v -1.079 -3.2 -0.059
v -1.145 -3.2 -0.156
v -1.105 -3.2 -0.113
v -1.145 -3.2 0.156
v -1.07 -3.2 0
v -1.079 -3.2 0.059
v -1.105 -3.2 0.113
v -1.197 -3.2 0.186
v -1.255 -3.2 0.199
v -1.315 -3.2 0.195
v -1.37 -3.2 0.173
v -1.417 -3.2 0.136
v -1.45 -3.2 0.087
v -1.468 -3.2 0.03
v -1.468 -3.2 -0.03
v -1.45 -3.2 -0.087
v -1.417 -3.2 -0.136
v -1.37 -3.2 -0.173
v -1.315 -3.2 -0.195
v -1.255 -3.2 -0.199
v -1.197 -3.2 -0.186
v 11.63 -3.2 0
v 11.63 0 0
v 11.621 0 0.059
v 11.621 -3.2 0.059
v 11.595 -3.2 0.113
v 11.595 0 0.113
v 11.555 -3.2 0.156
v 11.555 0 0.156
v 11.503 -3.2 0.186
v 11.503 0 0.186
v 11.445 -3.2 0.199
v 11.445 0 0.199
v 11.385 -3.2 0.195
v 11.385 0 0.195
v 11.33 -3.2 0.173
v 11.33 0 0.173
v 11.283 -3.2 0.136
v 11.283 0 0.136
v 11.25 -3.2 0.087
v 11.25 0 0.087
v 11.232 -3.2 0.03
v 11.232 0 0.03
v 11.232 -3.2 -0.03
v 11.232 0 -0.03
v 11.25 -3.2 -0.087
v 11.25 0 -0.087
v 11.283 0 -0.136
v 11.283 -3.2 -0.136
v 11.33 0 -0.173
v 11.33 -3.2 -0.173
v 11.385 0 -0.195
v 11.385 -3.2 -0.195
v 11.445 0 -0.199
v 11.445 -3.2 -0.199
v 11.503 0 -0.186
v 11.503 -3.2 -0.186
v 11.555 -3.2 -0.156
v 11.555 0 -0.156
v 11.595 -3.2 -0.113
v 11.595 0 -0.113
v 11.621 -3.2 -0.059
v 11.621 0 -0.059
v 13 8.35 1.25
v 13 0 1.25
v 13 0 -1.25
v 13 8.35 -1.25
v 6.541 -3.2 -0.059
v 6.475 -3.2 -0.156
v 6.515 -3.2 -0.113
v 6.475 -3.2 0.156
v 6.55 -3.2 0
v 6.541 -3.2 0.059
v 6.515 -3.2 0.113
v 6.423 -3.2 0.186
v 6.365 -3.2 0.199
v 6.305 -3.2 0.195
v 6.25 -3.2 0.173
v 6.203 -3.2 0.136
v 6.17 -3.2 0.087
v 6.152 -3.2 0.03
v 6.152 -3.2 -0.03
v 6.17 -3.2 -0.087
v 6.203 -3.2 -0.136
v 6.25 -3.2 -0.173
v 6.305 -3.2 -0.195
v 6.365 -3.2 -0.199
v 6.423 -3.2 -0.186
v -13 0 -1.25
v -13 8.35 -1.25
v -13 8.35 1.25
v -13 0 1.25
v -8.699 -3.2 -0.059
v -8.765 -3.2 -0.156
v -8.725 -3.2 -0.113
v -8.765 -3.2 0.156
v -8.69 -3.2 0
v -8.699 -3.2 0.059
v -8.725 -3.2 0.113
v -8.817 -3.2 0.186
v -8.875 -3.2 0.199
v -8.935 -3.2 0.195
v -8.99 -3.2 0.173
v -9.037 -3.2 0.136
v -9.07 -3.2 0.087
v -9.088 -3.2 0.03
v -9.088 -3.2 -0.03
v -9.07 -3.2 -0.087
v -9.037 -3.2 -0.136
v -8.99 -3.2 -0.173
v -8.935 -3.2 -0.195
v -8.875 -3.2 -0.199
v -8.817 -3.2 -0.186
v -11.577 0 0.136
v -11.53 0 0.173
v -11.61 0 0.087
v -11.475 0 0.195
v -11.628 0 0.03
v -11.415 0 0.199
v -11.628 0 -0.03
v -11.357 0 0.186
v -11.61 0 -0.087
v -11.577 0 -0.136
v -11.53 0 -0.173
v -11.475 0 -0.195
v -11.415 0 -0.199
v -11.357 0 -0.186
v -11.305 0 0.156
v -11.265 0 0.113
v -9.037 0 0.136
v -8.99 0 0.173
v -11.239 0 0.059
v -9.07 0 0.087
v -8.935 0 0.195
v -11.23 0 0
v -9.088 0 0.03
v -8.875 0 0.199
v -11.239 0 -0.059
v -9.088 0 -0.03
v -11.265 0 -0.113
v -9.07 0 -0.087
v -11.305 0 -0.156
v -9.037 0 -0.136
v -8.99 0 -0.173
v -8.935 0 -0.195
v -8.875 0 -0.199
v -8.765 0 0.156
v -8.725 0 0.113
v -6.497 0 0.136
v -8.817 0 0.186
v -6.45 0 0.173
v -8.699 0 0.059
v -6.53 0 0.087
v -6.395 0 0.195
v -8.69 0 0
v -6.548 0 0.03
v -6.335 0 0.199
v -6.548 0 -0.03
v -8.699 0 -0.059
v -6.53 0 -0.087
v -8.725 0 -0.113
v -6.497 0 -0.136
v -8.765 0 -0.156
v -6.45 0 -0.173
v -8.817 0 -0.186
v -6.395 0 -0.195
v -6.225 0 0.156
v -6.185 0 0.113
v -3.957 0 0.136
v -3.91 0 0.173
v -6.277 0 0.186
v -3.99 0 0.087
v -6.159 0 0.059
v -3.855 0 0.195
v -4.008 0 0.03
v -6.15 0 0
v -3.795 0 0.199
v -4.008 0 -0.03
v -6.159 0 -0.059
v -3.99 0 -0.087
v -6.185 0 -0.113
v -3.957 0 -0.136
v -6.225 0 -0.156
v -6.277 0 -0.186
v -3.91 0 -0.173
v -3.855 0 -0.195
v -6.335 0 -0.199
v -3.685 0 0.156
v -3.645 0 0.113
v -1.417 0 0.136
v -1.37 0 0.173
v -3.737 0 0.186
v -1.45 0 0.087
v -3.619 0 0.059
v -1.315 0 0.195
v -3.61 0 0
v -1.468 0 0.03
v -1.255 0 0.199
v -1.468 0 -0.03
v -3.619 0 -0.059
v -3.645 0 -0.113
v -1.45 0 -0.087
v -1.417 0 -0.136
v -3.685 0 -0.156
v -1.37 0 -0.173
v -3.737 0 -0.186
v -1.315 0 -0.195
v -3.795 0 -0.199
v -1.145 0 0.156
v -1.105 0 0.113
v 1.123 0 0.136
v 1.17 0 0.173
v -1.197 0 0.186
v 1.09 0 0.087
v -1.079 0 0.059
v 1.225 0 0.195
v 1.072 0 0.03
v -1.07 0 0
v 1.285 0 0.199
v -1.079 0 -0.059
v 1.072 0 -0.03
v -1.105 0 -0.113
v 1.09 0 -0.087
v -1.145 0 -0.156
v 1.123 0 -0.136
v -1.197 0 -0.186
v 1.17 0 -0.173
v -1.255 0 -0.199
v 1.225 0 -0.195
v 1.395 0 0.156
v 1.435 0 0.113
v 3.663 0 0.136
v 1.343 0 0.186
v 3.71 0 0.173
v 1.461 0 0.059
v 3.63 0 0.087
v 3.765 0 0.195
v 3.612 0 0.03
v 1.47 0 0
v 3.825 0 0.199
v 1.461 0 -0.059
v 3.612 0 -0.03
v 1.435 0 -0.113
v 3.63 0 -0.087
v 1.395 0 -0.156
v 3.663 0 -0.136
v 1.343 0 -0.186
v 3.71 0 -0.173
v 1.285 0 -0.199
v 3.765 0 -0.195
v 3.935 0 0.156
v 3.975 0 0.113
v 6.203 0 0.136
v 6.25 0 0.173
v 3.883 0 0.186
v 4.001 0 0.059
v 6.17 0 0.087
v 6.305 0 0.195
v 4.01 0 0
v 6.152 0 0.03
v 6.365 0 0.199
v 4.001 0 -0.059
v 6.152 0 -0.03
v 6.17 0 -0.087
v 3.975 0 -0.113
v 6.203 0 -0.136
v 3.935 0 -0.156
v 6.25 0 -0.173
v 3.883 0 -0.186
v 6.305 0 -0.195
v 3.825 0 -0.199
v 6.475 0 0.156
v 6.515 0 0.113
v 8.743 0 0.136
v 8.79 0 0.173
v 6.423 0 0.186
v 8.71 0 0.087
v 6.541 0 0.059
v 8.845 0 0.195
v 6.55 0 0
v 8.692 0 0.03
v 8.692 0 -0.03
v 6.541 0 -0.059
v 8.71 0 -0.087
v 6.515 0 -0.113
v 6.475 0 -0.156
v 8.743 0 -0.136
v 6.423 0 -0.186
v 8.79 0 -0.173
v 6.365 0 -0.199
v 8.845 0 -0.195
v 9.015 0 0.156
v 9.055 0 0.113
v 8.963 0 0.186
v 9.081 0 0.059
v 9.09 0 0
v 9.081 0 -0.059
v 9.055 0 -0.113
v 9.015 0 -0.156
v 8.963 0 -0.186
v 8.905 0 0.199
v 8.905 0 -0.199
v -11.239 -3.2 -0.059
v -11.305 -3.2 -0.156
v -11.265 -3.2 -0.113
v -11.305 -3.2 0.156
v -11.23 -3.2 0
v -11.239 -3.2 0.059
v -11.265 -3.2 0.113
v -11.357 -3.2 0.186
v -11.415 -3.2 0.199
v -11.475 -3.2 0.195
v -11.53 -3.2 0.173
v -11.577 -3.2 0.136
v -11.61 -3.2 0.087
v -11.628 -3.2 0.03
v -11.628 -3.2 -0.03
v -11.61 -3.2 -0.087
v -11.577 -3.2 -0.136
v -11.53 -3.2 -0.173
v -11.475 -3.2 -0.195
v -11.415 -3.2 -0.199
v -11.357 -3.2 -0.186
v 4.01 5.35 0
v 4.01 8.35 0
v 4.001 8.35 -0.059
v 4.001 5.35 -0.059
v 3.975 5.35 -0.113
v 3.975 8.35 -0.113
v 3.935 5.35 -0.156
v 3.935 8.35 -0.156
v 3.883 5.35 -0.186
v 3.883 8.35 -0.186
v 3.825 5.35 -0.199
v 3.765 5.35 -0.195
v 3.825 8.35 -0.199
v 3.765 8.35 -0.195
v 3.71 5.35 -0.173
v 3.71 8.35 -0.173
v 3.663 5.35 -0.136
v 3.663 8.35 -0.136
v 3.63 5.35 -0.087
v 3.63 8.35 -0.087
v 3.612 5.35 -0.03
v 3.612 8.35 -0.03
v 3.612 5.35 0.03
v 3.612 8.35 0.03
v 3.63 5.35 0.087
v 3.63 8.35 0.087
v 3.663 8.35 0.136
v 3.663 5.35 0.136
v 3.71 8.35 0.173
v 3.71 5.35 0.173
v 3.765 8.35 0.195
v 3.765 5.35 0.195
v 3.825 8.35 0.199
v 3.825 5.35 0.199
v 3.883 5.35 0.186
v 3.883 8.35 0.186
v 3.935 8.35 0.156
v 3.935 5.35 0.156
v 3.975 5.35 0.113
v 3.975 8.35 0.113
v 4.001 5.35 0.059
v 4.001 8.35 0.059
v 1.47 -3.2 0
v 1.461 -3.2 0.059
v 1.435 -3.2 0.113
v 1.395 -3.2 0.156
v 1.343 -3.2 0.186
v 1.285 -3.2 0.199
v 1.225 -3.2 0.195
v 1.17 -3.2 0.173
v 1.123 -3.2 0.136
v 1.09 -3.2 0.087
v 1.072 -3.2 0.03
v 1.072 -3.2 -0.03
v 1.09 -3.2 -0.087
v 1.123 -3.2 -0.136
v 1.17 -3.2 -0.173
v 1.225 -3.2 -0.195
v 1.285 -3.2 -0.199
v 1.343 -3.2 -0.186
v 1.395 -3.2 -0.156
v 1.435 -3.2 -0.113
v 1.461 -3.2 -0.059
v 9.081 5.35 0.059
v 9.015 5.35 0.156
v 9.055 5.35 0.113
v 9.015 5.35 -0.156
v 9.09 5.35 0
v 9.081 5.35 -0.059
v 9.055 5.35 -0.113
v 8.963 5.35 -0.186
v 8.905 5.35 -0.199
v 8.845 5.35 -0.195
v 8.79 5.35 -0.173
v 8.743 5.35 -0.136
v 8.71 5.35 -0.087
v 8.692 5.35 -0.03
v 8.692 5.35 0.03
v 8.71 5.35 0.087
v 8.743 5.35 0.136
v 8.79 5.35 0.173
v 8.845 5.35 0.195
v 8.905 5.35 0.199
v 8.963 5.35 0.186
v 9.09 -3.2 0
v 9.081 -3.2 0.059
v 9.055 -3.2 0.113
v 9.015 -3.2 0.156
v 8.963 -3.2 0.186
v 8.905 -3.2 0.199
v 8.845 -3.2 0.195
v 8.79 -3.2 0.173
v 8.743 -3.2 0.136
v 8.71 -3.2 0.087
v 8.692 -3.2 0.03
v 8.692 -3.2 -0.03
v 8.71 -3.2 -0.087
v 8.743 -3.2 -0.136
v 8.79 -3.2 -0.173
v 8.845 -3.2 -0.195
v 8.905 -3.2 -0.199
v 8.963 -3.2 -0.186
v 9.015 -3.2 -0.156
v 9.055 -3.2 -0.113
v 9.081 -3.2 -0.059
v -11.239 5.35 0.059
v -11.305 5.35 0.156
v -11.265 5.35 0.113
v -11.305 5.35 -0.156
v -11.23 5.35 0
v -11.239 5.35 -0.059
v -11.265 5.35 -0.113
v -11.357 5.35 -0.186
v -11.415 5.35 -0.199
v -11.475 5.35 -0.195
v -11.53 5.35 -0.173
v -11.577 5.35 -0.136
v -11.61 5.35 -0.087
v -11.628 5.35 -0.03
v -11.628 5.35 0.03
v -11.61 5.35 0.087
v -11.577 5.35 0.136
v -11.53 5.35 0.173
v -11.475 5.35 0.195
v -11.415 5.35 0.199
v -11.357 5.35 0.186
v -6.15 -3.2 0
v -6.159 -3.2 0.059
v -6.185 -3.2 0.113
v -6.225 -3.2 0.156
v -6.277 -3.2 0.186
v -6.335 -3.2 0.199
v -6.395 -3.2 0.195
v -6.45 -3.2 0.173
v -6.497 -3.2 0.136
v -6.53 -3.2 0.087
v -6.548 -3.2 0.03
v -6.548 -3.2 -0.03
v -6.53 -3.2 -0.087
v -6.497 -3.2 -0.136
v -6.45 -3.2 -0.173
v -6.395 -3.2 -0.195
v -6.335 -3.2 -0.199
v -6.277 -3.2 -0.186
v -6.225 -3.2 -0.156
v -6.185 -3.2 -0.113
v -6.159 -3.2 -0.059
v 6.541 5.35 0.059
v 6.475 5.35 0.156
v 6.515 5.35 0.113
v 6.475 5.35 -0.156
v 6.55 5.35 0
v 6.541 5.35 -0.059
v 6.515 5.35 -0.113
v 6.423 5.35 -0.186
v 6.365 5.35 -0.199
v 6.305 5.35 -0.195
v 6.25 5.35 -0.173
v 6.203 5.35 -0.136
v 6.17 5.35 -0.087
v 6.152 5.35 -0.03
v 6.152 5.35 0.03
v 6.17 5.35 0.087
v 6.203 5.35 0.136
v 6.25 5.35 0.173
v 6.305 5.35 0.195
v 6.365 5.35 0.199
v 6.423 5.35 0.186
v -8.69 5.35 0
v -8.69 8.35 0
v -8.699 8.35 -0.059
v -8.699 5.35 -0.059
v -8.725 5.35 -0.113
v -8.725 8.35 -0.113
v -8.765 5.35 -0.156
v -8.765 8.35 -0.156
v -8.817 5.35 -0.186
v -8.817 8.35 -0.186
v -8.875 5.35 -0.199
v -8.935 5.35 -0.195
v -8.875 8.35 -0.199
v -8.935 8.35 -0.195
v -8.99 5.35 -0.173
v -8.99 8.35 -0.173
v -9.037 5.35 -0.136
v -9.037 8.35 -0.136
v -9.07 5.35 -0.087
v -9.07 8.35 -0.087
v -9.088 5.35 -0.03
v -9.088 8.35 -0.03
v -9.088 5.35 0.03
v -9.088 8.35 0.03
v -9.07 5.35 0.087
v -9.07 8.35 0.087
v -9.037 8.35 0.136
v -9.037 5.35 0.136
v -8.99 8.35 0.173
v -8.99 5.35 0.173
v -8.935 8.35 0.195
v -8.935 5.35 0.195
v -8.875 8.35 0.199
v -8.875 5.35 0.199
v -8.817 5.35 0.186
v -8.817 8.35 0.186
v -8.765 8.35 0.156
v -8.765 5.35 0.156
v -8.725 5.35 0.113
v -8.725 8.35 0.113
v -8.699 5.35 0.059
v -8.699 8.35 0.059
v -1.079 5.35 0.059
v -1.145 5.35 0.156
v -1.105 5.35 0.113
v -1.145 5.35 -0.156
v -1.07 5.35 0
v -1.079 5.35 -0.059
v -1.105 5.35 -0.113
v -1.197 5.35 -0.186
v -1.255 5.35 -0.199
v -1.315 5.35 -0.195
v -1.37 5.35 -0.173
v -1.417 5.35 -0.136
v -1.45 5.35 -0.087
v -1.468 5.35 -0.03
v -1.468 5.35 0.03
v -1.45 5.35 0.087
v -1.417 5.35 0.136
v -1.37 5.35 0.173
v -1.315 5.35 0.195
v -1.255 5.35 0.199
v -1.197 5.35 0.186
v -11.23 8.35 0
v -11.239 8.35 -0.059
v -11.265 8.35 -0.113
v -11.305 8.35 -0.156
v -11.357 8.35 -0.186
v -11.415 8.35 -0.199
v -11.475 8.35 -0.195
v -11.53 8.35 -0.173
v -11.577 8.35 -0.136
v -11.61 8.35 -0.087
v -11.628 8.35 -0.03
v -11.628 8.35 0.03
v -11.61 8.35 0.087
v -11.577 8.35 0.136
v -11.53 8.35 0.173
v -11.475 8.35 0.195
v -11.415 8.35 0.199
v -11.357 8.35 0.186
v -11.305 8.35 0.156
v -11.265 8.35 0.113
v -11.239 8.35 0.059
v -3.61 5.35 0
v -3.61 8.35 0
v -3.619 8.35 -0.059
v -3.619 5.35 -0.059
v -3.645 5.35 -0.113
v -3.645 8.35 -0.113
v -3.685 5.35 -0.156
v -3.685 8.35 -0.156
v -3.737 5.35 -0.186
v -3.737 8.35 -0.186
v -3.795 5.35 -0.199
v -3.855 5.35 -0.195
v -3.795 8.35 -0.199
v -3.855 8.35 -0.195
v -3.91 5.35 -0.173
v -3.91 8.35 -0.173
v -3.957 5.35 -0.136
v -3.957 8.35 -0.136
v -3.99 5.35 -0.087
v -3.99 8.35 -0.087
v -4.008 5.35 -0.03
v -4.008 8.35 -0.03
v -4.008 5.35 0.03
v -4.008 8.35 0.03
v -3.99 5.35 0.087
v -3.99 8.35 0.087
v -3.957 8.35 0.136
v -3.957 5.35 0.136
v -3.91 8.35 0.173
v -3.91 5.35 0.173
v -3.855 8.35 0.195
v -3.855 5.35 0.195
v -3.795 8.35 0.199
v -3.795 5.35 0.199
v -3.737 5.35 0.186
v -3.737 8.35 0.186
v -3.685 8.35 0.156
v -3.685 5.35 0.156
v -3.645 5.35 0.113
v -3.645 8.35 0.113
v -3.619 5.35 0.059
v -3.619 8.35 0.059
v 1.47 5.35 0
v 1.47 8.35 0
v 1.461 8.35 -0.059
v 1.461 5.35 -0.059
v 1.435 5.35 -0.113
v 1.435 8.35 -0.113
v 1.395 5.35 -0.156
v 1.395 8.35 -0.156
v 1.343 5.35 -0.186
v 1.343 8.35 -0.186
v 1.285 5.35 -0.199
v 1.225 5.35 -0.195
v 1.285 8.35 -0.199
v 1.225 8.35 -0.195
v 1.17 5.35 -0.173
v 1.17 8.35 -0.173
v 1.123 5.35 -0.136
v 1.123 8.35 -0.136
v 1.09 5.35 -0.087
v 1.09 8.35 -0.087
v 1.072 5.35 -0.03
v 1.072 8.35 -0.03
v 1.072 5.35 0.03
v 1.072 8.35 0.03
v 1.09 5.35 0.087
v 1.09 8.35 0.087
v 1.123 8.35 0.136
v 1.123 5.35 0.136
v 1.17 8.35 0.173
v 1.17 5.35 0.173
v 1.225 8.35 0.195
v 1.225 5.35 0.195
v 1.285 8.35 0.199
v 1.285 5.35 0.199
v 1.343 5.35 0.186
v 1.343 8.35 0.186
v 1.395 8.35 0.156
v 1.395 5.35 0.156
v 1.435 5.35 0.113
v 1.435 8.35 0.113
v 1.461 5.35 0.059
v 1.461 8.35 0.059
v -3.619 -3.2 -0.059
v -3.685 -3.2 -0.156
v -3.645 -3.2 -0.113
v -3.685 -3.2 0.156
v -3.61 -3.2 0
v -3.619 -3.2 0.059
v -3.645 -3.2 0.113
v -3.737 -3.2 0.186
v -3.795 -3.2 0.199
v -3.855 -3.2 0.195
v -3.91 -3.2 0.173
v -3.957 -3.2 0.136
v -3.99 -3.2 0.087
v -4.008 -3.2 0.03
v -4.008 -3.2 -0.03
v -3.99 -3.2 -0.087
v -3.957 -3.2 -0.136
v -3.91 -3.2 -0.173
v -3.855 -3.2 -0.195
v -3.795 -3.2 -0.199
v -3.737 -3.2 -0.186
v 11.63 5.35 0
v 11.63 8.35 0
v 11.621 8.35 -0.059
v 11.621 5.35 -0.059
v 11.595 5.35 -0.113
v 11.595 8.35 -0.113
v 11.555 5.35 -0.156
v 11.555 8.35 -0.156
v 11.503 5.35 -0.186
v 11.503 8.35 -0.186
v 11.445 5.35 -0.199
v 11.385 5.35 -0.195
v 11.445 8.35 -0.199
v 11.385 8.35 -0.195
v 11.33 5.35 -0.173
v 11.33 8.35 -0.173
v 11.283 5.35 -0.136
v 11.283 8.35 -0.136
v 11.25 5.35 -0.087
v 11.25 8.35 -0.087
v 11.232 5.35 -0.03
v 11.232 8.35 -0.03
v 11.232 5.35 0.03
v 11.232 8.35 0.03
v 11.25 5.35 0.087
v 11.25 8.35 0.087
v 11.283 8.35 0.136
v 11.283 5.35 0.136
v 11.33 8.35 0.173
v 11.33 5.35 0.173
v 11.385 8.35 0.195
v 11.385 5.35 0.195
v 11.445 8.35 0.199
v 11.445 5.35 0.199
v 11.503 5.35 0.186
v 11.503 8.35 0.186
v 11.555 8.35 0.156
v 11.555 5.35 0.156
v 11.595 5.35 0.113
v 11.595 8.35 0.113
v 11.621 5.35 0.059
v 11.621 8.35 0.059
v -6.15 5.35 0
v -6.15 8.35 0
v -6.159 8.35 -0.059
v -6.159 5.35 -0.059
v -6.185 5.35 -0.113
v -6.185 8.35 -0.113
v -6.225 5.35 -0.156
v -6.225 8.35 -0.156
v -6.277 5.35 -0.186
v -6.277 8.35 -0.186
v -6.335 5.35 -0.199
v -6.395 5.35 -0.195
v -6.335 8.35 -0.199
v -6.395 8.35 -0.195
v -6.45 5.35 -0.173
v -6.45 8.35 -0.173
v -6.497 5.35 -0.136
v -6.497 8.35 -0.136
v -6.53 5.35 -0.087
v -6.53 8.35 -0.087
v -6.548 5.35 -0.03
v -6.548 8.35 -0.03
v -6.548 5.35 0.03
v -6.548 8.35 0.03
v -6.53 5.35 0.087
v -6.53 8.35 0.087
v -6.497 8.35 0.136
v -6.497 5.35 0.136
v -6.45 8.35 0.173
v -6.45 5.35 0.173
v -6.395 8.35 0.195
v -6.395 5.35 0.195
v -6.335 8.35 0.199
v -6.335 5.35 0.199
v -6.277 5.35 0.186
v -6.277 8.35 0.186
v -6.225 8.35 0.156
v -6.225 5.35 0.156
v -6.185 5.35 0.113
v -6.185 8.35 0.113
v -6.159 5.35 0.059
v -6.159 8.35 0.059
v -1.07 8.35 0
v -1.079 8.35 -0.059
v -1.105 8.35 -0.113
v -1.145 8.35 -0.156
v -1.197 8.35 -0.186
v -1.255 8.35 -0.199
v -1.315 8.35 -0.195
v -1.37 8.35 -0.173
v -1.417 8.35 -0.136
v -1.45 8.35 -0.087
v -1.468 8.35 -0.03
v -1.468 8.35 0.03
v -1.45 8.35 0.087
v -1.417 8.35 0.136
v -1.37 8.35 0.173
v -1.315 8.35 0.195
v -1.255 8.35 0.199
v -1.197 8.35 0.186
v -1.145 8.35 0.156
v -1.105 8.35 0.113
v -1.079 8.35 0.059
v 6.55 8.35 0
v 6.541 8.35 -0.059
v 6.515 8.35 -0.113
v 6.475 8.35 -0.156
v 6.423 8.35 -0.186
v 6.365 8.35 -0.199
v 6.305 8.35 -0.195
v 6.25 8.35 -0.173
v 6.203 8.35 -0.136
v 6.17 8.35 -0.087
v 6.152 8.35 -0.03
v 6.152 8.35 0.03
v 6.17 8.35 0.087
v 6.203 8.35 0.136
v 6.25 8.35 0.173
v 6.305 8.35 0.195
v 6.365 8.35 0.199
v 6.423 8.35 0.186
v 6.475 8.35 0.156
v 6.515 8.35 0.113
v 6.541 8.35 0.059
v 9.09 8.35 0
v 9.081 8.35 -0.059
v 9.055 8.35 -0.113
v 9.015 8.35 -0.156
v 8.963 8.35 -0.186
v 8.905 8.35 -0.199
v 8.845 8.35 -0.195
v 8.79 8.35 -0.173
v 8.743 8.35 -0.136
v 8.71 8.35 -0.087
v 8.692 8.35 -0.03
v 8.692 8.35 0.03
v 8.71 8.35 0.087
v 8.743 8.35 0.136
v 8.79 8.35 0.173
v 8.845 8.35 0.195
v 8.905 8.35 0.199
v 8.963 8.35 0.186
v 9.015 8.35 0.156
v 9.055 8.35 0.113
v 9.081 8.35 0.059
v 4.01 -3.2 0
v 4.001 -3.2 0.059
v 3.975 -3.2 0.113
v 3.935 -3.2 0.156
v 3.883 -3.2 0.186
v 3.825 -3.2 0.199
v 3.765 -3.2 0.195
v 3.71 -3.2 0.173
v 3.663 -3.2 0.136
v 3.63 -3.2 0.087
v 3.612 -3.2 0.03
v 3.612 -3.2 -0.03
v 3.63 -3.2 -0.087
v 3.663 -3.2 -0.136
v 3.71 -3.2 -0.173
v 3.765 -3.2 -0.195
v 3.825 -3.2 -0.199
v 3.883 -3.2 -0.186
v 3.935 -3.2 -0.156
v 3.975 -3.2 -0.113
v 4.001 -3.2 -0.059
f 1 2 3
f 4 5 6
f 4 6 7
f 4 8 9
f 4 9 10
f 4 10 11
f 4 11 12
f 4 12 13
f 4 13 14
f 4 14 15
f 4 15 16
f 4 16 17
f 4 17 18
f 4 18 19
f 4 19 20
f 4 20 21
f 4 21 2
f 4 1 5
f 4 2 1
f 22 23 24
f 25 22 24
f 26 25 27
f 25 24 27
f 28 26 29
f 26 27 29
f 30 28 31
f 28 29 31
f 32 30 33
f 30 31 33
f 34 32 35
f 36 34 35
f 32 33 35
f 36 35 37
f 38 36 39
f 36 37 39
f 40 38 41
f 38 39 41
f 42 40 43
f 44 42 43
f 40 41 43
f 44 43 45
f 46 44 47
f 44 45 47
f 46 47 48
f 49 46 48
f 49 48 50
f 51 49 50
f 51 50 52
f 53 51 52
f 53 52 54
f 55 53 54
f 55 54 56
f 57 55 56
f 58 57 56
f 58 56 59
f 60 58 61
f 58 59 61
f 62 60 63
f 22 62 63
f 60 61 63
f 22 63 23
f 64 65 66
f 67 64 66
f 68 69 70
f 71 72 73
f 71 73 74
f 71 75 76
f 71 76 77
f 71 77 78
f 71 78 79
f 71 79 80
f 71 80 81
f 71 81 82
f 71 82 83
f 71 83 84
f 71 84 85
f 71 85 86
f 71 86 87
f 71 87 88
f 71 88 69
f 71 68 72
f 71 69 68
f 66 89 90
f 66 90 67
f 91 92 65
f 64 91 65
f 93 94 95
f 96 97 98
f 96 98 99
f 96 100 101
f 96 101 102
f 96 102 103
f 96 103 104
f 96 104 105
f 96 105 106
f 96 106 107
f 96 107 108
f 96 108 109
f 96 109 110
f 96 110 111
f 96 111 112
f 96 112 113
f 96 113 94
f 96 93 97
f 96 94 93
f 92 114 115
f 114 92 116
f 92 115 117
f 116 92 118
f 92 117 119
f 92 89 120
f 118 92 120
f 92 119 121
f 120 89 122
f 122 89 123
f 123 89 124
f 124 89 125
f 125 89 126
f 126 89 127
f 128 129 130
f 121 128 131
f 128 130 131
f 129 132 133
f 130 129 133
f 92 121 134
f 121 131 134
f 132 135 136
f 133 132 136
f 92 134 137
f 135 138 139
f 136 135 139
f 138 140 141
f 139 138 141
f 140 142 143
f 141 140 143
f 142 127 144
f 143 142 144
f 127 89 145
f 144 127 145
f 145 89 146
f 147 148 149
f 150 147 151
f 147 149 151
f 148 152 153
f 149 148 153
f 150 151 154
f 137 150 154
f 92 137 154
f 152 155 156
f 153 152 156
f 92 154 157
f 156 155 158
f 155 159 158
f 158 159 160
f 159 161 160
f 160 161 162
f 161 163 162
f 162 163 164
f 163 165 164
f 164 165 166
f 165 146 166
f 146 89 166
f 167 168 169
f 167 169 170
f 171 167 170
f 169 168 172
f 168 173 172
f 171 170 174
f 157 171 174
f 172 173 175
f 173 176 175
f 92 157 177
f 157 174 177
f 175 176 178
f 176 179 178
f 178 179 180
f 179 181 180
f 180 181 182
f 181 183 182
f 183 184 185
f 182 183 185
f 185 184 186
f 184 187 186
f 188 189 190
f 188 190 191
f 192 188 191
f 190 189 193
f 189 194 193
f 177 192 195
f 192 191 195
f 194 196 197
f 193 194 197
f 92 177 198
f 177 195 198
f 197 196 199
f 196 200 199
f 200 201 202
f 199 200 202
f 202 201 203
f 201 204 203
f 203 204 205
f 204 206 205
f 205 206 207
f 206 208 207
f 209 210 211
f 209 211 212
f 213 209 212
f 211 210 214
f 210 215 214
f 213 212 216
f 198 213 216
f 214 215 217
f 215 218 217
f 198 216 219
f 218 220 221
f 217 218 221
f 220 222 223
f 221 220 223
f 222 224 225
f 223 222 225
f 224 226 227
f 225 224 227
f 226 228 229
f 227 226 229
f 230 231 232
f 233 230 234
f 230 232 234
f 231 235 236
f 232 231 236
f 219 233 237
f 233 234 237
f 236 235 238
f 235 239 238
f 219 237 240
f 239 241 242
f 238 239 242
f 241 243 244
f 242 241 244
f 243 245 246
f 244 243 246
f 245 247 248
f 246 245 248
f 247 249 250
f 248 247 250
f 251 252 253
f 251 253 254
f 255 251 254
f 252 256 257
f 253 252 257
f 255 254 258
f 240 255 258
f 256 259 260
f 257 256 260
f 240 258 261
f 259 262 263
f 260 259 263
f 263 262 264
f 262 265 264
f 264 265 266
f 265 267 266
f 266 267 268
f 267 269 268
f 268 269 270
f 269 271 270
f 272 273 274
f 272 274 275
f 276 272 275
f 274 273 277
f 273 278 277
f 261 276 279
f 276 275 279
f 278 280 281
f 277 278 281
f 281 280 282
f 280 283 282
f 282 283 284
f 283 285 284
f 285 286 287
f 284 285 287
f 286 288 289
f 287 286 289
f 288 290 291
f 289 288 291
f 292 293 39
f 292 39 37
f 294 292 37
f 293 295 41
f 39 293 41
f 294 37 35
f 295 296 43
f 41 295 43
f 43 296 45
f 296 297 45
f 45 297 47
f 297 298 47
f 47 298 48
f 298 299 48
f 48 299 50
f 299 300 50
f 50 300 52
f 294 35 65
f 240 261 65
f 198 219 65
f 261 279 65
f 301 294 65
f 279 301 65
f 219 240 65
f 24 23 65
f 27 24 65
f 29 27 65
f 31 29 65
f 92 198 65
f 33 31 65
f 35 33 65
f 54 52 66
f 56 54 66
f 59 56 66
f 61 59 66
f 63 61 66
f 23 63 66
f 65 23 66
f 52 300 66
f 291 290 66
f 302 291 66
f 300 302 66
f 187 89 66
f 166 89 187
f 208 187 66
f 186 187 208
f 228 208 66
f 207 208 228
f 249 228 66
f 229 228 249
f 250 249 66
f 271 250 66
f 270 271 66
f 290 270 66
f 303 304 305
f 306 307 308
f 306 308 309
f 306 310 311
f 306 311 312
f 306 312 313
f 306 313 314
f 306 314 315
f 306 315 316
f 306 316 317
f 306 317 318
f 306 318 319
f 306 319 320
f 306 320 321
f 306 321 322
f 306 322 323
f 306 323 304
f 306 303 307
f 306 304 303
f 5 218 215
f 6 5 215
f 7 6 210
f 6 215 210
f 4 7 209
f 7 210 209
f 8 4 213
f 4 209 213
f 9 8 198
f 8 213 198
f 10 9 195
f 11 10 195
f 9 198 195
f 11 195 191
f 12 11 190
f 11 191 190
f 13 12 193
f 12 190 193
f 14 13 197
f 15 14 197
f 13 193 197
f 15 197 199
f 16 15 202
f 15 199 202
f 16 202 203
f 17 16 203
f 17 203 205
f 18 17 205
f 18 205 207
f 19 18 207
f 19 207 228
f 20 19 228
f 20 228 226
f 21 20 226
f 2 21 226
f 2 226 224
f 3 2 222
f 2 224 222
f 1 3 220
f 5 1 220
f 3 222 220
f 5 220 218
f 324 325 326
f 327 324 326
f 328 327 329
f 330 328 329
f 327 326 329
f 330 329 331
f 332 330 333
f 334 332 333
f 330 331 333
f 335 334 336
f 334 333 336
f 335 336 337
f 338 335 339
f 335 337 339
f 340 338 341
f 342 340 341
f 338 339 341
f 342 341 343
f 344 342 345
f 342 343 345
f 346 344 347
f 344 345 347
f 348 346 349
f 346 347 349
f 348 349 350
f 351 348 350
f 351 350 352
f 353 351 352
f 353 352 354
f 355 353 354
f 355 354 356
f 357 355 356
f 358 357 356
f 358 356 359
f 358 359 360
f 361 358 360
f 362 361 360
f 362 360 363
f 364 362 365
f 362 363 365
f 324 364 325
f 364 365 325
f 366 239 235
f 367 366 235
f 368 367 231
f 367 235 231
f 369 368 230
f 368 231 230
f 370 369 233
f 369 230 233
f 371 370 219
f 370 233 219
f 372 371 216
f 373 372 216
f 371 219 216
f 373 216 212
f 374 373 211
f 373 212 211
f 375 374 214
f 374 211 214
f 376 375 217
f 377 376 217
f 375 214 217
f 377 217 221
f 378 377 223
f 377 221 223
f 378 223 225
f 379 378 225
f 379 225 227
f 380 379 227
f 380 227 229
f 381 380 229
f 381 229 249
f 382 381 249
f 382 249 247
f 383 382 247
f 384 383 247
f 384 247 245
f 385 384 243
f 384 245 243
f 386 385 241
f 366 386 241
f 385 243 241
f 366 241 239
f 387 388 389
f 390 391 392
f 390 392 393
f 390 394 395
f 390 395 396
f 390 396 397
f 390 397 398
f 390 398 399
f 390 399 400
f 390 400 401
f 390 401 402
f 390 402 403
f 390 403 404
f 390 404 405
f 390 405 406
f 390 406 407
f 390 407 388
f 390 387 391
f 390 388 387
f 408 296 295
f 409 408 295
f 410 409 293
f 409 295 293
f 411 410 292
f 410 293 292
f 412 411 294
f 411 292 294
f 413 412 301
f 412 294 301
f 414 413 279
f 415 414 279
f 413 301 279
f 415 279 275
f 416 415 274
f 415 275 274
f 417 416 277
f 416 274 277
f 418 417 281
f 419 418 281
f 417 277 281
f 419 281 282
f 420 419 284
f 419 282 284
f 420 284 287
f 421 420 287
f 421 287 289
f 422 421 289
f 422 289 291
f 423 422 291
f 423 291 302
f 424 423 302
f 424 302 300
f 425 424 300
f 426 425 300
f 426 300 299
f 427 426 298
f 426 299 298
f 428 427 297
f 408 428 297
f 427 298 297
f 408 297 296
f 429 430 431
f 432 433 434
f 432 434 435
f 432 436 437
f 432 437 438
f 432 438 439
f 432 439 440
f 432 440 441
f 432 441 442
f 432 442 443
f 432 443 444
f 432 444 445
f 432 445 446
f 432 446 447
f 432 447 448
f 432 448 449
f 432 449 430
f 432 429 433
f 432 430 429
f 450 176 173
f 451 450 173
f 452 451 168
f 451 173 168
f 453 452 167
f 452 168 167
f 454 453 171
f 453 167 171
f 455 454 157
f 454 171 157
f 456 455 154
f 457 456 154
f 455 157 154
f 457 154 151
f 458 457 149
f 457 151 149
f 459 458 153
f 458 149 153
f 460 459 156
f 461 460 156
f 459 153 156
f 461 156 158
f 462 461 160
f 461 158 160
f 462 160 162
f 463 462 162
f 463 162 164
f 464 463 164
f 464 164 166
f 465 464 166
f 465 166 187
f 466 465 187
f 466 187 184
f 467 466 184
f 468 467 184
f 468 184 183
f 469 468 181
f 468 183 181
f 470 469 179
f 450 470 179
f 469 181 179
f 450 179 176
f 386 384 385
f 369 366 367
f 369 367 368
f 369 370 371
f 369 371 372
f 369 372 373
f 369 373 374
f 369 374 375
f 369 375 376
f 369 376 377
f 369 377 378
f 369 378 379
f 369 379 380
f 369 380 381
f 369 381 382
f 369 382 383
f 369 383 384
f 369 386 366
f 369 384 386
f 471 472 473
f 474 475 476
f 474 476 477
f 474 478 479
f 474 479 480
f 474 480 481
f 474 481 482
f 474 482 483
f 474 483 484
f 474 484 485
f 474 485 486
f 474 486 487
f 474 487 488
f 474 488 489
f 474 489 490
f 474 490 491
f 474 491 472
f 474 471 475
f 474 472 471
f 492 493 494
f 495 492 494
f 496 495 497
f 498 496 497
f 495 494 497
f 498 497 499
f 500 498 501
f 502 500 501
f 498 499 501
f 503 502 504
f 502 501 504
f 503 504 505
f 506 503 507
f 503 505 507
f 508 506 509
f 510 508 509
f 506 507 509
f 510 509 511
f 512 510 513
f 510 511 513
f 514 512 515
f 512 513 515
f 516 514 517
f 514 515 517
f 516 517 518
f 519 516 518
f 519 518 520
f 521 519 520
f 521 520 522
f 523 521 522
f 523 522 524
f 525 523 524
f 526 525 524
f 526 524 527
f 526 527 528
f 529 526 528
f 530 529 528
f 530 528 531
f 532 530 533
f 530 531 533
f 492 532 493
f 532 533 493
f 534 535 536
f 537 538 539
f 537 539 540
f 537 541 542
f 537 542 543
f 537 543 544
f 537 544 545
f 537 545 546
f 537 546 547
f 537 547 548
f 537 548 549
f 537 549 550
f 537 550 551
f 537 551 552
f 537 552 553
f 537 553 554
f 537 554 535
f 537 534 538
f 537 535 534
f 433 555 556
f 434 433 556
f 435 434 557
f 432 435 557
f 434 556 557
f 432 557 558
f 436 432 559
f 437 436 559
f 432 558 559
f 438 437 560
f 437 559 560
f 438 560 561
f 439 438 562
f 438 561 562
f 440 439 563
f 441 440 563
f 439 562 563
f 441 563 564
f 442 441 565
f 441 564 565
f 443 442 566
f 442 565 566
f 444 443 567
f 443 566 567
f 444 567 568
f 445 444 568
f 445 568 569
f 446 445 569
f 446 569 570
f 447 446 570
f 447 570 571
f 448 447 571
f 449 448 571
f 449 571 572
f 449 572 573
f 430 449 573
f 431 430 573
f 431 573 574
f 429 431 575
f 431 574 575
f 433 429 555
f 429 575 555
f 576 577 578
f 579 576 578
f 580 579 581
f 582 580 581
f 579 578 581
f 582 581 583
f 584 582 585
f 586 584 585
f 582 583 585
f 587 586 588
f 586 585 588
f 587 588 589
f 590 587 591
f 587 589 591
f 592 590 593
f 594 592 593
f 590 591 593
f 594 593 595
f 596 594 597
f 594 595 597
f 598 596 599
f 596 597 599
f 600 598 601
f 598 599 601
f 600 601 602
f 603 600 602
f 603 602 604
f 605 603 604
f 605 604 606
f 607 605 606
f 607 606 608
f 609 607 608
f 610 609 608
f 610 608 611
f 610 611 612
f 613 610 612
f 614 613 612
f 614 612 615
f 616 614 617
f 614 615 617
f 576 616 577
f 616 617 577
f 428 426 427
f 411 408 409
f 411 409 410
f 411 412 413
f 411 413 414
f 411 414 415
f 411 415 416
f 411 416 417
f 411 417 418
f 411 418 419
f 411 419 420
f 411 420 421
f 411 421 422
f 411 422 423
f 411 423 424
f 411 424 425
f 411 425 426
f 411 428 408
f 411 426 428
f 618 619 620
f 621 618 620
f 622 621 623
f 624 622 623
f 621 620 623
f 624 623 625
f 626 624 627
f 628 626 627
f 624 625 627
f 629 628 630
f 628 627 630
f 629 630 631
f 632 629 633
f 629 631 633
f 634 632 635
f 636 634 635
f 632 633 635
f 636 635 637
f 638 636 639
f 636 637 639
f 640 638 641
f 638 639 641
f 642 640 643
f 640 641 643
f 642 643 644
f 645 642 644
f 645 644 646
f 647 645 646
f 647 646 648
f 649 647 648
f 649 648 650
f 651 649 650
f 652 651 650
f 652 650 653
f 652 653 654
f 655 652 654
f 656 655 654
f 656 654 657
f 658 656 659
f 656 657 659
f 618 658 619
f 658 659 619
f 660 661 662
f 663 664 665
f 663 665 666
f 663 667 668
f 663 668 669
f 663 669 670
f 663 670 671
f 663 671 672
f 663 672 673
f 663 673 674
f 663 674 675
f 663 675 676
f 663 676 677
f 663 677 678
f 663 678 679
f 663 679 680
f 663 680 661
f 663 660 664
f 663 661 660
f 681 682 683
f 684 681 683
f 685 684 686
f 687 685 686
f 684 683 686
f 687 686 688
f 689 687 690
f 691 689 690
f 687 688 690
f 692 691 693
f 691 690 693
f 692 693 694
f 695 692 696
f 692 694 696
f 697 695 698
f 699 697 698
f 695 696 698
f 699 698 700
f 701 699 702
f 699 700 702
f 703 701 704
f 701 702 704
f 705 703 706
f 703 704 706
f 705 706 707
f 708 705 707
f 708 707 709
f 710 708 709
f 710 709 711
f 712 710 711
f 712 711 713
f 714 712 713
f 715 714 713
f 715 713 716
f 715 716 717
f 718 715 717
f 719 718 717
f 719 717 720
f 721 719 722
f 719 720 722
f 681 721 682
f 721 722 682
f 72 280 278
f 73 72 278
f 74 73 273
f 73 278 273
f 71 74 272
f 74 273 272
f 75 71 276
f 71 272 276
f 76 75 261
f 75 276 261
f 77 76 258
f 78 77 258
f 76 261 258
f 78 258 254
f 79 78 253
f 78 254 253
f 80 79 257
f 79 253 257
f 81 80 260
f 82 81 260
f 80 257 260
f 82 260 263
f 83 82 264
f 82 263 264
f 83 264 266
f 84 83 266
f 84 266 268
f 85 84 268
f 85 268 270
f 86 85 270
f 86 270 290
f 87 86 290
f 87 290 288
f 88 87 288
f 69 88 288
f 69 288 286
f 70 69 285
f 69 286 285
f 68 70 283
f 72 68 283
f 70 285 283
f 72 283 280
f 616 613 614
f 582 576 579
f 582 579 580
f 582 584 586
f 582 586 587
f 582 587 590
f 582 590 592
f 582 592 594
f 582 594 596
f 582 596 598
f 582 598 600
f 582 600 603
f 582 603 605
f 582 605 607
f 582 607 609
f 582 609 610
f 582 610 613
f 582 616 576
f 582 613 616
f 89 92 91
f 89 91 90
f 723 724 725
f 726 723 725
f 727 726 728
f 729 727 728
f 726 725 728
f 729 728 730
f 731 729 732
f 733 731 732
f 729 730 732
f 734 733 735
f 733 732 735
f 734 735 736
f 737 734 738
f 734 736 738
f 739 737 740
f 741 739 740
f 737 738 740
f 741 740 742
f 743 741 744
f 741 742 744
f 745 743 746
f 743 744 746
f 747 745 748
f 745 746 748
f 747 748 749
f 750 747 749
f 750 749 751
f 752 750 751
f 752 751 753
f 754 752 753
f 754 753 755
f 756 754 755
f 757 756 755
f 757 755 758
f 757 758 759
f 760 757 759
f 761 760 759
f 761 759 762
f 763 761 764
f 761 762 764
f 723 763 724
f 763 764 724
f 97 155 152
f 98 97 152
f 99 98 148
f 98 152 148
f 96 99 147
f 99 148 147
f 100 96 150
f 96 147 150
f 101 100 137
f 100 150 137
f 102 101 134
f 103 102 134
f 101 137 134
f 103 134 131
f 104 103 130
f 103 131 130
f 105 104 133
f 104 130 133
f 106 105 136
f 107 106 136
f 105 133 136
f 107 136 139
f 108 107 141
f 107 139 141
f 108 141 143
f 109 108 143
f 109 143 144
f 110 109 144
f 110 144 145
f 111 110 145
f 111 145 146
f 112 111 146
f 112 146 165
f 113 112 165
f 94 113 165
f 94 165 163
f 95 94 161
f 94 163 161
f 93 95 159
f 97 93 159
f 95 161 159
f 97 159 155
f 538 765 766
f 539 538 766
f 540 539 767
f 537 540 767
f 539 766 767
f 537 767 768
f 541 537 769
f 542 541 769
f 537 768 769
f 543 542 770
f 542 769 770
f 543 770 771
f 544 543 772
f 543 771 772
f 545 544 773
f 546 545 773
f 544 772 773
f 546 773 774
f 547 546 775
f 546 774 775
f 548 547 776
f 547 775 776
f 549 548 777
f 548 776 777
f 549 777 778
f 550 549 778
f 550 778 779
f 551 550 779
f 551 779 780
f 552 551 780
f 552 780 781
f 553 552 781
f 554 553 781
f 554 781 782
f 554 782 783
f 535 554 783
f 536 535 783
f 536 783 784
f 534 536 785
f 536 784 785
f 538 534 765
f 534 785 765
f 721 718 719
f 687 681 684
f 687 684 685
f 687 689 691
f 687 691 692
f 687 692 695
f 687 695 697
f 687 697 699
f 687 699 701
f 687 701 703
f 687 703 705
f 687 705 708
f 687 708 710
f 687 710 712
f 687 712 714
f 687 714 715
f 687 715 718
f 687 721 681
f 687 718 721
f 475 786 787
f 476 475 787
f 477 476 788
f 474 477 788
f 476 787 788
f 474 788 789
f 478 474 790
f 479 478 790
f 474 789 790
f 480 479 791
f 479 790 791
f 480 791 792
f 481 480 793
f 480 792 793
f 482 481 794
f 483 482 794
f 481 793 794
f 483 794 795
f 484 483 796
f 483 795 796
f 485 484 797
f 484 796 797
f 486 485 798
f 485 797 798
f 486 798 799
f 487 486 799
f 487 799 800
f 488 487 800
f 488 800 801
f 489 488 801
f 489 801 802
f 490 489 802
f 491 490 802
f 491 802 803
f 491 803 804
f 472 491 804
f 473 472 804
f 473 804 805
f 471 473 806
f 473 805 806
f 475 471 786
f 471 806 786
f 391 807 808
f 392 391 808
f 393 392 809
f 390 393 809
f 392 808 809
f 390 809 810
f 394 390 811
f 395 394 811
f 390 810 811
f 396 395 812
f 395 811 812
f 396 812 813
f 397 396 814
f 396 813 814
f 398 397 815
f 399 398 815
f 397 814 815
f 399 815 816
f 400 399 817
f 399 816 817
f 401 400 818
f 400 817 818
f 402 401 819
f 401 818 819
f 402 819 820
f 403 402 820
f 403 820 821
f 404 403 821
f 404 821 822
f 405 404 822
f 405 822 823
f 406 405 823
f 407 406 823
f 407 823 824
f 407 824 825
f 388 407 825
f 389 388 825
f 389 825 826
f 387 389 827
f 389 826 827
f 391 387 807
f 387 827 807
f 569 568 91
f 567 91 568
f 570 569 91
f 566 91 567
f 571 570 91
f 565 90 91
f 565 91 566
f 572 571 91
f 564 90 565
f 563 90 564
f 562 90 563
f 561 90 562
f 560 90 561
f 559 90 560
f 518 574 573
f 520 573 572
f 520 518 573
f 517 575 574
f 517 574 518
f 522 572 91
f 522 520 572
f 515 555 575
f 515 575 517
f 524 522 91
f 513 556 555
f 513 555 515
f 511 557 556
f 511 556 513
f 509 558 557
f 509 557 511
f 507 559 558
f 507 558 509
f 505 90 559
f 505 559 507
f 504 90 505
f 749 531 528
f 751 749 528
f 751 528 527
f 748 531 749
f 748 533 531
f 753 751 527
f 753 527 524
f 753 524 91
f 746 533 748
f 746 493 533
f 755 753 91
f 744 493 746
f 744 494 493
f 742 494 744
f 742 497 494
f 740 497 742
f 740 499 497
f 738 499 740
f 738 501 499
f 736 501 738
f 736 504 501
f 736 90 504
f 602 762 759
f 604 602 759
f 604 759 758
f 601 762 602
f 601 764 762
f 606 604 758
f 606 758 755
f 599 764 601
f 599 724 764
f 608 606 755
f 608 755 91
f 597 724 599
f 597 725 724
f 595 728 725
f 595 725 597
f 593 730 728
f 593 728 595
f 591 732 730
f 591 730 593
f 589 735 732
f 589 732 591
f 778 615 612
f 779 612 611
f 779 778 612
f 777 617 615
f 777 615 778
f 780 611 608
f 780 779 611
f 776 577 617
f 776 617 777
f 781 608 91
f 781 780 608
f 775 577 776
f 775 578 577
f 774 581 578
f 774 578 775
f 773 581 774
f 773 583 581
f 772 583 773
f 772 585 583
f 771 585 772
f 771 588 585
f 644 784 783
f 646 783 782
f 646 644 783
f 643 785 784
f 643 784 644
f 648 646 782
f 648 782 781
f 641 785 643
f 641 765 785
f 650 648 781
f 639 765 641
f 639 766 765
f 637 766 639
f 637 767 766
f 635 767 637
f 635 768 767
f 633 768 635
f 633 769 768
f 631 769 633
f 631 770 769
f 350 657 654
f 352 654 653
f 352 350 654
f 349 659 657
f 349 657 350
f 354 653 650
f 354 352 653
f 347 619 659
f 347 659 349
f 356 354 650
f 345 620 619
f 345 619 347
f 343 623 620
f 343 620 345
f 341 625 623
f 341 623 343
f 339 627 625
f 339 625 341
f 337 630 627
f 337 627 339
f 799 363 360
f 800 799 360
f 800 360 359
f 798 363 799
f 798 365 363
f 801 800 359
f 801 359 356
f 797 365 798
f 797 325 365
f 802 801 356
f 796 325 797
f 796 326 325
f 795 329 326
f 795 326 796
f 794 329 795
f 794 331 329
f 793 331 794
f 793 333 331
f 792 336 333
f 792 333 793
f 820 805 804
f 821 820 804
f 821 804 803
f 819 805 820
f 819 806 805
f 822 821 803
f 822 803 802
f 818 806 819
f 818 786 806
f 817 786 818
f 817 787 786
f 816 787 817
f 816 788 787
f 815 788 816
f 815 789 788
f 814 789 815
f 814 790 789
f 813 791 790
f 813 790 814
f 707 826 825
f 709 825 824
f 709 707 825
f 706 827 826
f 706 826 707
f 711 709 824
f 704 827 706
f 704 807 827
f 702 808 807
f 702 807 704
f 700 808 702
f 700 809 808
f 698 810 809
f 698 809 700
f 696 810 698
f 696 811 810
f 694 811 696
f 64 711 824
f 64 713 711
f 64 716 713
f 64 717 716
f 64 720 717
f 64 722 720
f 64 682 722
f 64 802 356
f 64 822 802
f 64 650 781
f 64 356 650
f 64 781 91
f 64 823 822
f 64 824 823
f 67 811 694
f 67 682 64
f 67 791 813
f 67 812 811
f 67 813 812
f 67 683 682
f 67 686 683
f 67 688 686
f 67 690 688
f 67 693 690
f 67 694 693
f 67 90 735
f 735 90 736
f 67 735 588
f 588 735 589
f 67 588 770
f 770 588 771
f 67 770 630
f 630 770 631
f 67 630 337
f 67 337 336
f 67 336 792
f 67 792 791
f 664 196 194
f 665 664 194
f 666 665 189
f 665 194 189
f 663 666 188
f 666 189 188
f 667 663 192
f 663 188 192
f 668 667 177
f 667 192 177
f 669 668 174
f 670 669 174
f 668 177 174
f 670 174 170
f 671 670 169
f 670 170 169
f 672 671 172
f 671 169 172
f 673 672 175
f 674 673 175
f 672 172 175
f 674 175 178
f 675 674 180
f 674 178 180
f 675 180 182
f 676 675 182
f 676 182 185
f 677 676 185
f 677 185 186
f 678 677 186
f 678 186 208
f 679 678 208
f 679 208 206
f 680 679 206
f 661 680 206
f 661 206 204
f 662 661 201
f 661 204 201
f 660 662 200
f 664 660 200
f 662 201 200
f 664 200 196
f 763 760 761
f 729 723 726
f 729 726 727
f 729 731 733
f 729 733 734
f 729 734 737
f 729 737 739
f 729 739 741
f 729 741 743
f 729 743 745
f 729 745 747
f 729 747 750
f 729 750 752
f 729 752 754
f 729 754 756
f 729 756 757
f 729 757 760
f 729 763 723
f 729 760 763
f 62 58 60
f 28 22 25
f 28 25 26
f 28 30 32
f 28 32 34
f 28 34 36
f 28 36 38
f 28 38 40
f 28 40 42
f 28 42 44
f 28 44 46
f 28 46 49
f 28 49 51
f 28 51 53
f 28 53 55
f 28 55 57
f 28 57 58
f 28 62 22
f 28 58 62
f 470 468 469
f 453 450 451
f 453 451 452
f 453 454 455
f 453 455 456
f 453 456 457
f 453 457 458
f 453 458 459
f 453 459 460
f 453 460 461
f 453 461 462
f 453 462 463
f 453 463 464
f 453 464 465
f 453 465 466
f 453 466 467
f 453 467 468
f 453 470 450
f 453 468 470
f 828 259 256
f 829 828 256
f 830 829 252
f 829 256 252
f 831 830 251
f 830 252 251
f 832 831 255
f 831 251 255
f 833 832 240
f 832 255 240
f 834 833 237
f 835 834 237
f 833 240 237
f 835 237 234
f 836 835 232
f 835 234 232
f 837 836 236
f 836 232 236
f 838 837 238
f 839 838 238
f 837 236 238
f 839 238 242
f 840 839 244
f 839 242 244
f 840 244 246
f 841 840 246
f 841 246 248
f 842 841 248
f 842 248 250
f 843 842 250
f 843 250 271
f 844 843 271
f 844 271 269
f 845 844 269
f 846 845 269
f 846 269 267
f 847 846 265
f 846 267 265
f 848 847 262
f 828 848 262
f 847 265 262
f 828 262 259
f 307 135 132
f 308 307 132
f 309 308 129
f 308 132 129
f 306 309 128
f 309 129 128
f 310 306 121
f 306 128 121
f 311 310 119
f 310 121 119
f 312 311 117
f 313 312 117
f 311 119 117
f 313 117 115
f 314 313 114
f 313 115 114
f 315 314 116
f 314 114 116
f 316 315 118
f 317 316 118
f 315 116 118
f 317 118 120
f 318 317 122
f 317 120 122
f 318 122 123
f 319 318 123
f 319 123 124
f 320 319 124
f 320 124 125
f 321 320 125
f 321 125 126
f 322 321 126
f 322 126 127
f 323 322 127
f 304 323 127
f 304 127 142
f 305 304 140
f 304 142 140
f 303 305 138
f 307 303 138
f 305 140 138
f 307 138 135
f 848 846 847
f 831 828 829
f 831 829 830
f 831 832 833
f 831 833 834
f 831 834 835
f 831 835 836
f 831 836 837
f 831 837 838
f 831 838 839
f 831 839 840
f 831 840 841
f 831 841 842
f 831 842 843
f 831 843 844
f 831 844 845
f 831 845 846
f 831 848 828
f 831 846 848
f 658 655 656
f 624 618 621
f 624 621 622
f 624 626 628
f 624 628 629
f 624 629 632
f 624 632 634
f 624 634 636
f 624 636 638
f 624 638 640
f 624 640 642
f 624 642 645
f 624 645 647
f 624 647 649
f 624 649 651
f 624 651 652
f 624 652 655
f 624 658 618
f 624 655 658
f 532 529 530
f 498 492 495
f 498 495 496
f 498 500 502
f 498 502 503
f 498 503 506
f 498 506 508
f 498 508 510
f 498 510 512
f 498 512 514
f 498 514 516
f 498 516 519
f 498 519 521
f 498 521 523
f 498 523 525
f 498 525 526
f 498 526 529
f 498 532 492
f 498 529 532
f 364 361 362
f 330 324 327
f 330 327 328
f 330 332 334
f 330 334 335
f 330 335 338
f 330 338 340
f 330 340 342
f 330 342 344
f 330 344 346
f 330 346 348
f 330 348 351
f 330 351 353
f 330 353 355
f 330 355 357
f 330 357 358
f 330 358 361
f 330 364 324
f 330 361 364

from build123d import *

# Parameters (mm, degrees)
SKETCH1_W           = 26
SKETCH1_H           = 2.5
BOSS_EXTRUDE1_DEPTH = 8.35
SKETCH2_R           = 0.2
CUT_EXTRUDE1_DEPTH  = 3
SKETCH3_R           = 0.2
BOSS_EXTRUDE2_DEPTH = 3.2
LPATTERN1_COUNT     = 10
LPATTERN1_PITCH     = 2.54


with BuildPart() as part:
    # Sketch1 → Boss-Extrude1 (new body)
    with BuildSketch(Plane(origin=(0, 0, 0), x_dir=(1, 0, 0), z_dir=(0, 1, 0))):
        Rectangle(SKETCH1_W, SKETCH1_H)
    extrude(amount=BOSS_EXTRUDE1_DEPTH)

    # Sketch2 → Cut-Extrude1 (cut)
    with BuildSketch(Plane(origin=(0, 8.35, 0), x_dir=(1, 0, 0), z_dir=(0, 1, 0))):
        with Locations((-11.43, 0)):
            Circle(SKETCH2_R)
    cut_extrude1 = extrude(amount=-CUT_EXTRUDE1_DEPTH, mode=Mode.SUBTRACT)

    # Sketch3 → Boss-Extrude2 (add)
    with BuildSketch(Plane.XZ):
        with Locations((-11.43, 0)):
            Circle(SKETCH3_R)
    boss_extrude2 = extrude(amount=BOSS_EXTRUDE2_DEPTH)

    # LPattern1: Cut-Extrude1, Boss-Extrude2 ×10
    with Locations(*[(i * LPATTERN1_PITCH, 0, 0) for i in range(1, LPATTERN1_COUNT)]):
        add(cut_extrude1, mode=Mode.SUBTRACT)
        add(boss_extrude2)


solid = part.part
